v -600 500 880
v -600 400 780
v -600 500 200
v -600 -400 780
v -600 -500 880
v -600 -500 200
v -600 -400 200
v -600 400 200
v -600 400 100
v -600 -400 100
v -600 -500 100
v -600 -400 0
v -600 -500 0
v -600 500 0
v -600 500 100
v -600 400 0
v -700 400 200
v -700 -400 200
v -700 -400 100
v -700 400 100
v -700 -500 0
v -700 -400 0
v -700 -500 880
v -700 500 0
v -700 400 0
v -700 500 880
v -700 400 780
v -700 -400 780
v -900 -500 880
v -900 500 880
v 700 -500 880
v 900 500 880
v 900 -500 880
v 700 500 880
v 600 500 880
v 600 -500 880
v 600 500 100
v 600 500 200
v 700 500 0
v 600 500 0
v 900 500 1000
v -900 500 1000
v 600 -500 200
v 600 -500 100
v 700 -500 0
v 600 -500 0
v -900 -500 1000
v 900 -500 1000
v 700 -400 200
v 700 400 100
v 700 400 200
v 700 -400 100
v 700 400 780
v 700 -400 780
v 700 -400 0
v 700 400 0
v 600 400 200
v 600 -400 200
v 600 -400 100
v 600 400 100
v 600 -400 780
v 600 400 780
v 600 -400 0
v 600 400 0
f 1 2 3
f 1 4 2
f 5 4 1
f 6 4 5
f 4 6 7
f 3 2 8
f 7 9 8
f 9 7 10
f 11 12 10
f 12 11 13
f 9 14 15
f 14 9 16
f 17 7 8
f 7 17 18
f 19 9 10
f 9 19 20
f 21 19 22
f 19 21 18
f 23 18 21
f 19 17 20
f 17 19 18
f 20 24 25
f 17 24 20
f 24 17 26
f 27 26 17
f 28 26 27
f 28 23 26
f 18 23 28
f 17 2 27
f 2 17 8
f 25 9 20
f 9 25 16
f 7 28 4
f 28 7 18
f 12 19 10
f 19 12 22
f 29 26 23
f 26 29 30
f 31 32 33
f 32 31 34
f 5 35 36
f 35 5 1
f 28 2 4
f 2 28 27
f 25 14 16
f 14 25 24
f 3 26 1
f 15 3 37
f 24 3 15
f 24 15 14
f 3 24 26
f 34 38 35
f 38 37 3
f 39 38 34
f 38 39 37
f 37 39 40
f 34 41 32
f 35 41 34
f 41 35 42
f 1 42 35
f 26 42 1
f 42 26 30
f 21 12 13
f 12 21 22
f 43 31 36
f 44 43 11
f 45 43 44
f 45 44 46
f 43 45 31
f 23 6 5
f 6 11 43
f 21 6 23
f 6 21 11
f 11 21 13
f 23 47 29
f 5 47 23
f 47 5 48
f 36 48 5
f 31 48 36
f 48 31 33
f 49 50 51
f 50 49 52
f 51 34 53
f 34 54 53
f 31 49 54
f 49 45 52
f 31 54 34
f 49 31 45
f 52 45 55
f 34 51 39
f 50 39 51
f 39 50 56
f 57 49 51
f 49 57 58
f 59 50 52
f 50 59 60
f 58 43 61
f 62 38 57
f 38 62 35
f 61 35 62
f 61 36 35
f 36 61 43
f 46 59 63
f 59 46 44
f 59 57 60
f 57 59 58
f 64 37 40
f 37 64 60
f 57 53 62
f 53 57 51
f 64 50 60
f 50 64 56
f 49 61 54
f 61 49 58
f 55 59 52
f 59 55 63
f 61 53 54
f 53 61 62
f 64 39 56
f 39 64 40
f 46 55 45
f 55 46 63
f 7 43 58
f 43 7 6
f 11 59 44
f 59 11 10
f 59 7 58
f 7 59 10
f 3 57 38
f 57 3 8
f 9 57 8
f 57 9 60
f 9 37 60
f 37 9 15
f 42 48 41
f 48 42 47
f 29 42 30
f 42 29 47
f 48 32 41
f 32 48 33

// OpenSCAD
module scrapWoodStorage(width = 1000, length = 1500, height = 1000, deskThickness = 80, legThickness = 80, overstandDesk = 50) {

    legInnerWidth = width - legThickness * 2;
    legInnerLength = length - overstandDesk * 2 - legThickness * 2;
    legInnerHeight = height - deskThickness;

    module desk() {
        rotate([0, 0, 90]) translate([0, 0, deskThickness/2 + height - deskThickness]) cube(size = [width, length, deskThickness], center = true);
    }

    module legBase() {
        translate([-legInnerLength/2 - legThickness/2, 0, 0]) {
            leg();
            translate([legInnerLength+legThickness, 0, 0]) leg();
            
            // bottom right cross beam lenth
            rotate([0, 0, 90]) translate([-(legInnerWidth/2 + legThickness/2), -(legInnerLength/2 + legThickness/2), legThickness + legThickness/2]) cube(size=[legThickness, legInnerLength, legThickness], center = true);
            rotate([0, 0, 90]) translate([+(legInnerWidth/2 + legThickness/2), -(legInnerLength/2 + legThickness/2), legThickness + legThickness/2]) cube(size=[legThickness, legInnerLength, legThickness], center = true);
        }
    }

    module leg() {
        // bottom cross beam width
        translate([0, 0, legThickness + legThickness/2]) cube(size=[legThickness, legInnerWidth, legThickness], center = true);
        // top cross beam width
        translate([0, 0, legInnerHeight - legThickness/2]) cube(size=[legThickness, legInnerWidth, legThickness], center = true);

        // left leg
        translate([0, legInnerWidth/2 + legThickness/2, legInnerHeight/2]) cube(size=[legThickness, legThickness, legInnerHeight], center = true);
        // right leg
        translate([0, -(legInnerWidth/2 + legThickness/2), legInnerHeight/2]) cube(size=[legThickness, legThickness, legInnerHeight], center = true);
    }

    color("#FF9966") legBase();
    desk();
}

//scaleFactor = 10;
//scale([1 / scaleFactor, 1 / scaleFactor, 1 / scaleFactor]) {
    // translate for printing
    //translate([0,0,1000])
    // rotate for printing
    //rotate([0, 180, 0])
    scrapWoodStorage(
        width = 1000,
        length = 1800,
        height = 1000,
        deskThickness = 120,
        legThickness = 100,
        overstandDesk = 200
    );
//}
